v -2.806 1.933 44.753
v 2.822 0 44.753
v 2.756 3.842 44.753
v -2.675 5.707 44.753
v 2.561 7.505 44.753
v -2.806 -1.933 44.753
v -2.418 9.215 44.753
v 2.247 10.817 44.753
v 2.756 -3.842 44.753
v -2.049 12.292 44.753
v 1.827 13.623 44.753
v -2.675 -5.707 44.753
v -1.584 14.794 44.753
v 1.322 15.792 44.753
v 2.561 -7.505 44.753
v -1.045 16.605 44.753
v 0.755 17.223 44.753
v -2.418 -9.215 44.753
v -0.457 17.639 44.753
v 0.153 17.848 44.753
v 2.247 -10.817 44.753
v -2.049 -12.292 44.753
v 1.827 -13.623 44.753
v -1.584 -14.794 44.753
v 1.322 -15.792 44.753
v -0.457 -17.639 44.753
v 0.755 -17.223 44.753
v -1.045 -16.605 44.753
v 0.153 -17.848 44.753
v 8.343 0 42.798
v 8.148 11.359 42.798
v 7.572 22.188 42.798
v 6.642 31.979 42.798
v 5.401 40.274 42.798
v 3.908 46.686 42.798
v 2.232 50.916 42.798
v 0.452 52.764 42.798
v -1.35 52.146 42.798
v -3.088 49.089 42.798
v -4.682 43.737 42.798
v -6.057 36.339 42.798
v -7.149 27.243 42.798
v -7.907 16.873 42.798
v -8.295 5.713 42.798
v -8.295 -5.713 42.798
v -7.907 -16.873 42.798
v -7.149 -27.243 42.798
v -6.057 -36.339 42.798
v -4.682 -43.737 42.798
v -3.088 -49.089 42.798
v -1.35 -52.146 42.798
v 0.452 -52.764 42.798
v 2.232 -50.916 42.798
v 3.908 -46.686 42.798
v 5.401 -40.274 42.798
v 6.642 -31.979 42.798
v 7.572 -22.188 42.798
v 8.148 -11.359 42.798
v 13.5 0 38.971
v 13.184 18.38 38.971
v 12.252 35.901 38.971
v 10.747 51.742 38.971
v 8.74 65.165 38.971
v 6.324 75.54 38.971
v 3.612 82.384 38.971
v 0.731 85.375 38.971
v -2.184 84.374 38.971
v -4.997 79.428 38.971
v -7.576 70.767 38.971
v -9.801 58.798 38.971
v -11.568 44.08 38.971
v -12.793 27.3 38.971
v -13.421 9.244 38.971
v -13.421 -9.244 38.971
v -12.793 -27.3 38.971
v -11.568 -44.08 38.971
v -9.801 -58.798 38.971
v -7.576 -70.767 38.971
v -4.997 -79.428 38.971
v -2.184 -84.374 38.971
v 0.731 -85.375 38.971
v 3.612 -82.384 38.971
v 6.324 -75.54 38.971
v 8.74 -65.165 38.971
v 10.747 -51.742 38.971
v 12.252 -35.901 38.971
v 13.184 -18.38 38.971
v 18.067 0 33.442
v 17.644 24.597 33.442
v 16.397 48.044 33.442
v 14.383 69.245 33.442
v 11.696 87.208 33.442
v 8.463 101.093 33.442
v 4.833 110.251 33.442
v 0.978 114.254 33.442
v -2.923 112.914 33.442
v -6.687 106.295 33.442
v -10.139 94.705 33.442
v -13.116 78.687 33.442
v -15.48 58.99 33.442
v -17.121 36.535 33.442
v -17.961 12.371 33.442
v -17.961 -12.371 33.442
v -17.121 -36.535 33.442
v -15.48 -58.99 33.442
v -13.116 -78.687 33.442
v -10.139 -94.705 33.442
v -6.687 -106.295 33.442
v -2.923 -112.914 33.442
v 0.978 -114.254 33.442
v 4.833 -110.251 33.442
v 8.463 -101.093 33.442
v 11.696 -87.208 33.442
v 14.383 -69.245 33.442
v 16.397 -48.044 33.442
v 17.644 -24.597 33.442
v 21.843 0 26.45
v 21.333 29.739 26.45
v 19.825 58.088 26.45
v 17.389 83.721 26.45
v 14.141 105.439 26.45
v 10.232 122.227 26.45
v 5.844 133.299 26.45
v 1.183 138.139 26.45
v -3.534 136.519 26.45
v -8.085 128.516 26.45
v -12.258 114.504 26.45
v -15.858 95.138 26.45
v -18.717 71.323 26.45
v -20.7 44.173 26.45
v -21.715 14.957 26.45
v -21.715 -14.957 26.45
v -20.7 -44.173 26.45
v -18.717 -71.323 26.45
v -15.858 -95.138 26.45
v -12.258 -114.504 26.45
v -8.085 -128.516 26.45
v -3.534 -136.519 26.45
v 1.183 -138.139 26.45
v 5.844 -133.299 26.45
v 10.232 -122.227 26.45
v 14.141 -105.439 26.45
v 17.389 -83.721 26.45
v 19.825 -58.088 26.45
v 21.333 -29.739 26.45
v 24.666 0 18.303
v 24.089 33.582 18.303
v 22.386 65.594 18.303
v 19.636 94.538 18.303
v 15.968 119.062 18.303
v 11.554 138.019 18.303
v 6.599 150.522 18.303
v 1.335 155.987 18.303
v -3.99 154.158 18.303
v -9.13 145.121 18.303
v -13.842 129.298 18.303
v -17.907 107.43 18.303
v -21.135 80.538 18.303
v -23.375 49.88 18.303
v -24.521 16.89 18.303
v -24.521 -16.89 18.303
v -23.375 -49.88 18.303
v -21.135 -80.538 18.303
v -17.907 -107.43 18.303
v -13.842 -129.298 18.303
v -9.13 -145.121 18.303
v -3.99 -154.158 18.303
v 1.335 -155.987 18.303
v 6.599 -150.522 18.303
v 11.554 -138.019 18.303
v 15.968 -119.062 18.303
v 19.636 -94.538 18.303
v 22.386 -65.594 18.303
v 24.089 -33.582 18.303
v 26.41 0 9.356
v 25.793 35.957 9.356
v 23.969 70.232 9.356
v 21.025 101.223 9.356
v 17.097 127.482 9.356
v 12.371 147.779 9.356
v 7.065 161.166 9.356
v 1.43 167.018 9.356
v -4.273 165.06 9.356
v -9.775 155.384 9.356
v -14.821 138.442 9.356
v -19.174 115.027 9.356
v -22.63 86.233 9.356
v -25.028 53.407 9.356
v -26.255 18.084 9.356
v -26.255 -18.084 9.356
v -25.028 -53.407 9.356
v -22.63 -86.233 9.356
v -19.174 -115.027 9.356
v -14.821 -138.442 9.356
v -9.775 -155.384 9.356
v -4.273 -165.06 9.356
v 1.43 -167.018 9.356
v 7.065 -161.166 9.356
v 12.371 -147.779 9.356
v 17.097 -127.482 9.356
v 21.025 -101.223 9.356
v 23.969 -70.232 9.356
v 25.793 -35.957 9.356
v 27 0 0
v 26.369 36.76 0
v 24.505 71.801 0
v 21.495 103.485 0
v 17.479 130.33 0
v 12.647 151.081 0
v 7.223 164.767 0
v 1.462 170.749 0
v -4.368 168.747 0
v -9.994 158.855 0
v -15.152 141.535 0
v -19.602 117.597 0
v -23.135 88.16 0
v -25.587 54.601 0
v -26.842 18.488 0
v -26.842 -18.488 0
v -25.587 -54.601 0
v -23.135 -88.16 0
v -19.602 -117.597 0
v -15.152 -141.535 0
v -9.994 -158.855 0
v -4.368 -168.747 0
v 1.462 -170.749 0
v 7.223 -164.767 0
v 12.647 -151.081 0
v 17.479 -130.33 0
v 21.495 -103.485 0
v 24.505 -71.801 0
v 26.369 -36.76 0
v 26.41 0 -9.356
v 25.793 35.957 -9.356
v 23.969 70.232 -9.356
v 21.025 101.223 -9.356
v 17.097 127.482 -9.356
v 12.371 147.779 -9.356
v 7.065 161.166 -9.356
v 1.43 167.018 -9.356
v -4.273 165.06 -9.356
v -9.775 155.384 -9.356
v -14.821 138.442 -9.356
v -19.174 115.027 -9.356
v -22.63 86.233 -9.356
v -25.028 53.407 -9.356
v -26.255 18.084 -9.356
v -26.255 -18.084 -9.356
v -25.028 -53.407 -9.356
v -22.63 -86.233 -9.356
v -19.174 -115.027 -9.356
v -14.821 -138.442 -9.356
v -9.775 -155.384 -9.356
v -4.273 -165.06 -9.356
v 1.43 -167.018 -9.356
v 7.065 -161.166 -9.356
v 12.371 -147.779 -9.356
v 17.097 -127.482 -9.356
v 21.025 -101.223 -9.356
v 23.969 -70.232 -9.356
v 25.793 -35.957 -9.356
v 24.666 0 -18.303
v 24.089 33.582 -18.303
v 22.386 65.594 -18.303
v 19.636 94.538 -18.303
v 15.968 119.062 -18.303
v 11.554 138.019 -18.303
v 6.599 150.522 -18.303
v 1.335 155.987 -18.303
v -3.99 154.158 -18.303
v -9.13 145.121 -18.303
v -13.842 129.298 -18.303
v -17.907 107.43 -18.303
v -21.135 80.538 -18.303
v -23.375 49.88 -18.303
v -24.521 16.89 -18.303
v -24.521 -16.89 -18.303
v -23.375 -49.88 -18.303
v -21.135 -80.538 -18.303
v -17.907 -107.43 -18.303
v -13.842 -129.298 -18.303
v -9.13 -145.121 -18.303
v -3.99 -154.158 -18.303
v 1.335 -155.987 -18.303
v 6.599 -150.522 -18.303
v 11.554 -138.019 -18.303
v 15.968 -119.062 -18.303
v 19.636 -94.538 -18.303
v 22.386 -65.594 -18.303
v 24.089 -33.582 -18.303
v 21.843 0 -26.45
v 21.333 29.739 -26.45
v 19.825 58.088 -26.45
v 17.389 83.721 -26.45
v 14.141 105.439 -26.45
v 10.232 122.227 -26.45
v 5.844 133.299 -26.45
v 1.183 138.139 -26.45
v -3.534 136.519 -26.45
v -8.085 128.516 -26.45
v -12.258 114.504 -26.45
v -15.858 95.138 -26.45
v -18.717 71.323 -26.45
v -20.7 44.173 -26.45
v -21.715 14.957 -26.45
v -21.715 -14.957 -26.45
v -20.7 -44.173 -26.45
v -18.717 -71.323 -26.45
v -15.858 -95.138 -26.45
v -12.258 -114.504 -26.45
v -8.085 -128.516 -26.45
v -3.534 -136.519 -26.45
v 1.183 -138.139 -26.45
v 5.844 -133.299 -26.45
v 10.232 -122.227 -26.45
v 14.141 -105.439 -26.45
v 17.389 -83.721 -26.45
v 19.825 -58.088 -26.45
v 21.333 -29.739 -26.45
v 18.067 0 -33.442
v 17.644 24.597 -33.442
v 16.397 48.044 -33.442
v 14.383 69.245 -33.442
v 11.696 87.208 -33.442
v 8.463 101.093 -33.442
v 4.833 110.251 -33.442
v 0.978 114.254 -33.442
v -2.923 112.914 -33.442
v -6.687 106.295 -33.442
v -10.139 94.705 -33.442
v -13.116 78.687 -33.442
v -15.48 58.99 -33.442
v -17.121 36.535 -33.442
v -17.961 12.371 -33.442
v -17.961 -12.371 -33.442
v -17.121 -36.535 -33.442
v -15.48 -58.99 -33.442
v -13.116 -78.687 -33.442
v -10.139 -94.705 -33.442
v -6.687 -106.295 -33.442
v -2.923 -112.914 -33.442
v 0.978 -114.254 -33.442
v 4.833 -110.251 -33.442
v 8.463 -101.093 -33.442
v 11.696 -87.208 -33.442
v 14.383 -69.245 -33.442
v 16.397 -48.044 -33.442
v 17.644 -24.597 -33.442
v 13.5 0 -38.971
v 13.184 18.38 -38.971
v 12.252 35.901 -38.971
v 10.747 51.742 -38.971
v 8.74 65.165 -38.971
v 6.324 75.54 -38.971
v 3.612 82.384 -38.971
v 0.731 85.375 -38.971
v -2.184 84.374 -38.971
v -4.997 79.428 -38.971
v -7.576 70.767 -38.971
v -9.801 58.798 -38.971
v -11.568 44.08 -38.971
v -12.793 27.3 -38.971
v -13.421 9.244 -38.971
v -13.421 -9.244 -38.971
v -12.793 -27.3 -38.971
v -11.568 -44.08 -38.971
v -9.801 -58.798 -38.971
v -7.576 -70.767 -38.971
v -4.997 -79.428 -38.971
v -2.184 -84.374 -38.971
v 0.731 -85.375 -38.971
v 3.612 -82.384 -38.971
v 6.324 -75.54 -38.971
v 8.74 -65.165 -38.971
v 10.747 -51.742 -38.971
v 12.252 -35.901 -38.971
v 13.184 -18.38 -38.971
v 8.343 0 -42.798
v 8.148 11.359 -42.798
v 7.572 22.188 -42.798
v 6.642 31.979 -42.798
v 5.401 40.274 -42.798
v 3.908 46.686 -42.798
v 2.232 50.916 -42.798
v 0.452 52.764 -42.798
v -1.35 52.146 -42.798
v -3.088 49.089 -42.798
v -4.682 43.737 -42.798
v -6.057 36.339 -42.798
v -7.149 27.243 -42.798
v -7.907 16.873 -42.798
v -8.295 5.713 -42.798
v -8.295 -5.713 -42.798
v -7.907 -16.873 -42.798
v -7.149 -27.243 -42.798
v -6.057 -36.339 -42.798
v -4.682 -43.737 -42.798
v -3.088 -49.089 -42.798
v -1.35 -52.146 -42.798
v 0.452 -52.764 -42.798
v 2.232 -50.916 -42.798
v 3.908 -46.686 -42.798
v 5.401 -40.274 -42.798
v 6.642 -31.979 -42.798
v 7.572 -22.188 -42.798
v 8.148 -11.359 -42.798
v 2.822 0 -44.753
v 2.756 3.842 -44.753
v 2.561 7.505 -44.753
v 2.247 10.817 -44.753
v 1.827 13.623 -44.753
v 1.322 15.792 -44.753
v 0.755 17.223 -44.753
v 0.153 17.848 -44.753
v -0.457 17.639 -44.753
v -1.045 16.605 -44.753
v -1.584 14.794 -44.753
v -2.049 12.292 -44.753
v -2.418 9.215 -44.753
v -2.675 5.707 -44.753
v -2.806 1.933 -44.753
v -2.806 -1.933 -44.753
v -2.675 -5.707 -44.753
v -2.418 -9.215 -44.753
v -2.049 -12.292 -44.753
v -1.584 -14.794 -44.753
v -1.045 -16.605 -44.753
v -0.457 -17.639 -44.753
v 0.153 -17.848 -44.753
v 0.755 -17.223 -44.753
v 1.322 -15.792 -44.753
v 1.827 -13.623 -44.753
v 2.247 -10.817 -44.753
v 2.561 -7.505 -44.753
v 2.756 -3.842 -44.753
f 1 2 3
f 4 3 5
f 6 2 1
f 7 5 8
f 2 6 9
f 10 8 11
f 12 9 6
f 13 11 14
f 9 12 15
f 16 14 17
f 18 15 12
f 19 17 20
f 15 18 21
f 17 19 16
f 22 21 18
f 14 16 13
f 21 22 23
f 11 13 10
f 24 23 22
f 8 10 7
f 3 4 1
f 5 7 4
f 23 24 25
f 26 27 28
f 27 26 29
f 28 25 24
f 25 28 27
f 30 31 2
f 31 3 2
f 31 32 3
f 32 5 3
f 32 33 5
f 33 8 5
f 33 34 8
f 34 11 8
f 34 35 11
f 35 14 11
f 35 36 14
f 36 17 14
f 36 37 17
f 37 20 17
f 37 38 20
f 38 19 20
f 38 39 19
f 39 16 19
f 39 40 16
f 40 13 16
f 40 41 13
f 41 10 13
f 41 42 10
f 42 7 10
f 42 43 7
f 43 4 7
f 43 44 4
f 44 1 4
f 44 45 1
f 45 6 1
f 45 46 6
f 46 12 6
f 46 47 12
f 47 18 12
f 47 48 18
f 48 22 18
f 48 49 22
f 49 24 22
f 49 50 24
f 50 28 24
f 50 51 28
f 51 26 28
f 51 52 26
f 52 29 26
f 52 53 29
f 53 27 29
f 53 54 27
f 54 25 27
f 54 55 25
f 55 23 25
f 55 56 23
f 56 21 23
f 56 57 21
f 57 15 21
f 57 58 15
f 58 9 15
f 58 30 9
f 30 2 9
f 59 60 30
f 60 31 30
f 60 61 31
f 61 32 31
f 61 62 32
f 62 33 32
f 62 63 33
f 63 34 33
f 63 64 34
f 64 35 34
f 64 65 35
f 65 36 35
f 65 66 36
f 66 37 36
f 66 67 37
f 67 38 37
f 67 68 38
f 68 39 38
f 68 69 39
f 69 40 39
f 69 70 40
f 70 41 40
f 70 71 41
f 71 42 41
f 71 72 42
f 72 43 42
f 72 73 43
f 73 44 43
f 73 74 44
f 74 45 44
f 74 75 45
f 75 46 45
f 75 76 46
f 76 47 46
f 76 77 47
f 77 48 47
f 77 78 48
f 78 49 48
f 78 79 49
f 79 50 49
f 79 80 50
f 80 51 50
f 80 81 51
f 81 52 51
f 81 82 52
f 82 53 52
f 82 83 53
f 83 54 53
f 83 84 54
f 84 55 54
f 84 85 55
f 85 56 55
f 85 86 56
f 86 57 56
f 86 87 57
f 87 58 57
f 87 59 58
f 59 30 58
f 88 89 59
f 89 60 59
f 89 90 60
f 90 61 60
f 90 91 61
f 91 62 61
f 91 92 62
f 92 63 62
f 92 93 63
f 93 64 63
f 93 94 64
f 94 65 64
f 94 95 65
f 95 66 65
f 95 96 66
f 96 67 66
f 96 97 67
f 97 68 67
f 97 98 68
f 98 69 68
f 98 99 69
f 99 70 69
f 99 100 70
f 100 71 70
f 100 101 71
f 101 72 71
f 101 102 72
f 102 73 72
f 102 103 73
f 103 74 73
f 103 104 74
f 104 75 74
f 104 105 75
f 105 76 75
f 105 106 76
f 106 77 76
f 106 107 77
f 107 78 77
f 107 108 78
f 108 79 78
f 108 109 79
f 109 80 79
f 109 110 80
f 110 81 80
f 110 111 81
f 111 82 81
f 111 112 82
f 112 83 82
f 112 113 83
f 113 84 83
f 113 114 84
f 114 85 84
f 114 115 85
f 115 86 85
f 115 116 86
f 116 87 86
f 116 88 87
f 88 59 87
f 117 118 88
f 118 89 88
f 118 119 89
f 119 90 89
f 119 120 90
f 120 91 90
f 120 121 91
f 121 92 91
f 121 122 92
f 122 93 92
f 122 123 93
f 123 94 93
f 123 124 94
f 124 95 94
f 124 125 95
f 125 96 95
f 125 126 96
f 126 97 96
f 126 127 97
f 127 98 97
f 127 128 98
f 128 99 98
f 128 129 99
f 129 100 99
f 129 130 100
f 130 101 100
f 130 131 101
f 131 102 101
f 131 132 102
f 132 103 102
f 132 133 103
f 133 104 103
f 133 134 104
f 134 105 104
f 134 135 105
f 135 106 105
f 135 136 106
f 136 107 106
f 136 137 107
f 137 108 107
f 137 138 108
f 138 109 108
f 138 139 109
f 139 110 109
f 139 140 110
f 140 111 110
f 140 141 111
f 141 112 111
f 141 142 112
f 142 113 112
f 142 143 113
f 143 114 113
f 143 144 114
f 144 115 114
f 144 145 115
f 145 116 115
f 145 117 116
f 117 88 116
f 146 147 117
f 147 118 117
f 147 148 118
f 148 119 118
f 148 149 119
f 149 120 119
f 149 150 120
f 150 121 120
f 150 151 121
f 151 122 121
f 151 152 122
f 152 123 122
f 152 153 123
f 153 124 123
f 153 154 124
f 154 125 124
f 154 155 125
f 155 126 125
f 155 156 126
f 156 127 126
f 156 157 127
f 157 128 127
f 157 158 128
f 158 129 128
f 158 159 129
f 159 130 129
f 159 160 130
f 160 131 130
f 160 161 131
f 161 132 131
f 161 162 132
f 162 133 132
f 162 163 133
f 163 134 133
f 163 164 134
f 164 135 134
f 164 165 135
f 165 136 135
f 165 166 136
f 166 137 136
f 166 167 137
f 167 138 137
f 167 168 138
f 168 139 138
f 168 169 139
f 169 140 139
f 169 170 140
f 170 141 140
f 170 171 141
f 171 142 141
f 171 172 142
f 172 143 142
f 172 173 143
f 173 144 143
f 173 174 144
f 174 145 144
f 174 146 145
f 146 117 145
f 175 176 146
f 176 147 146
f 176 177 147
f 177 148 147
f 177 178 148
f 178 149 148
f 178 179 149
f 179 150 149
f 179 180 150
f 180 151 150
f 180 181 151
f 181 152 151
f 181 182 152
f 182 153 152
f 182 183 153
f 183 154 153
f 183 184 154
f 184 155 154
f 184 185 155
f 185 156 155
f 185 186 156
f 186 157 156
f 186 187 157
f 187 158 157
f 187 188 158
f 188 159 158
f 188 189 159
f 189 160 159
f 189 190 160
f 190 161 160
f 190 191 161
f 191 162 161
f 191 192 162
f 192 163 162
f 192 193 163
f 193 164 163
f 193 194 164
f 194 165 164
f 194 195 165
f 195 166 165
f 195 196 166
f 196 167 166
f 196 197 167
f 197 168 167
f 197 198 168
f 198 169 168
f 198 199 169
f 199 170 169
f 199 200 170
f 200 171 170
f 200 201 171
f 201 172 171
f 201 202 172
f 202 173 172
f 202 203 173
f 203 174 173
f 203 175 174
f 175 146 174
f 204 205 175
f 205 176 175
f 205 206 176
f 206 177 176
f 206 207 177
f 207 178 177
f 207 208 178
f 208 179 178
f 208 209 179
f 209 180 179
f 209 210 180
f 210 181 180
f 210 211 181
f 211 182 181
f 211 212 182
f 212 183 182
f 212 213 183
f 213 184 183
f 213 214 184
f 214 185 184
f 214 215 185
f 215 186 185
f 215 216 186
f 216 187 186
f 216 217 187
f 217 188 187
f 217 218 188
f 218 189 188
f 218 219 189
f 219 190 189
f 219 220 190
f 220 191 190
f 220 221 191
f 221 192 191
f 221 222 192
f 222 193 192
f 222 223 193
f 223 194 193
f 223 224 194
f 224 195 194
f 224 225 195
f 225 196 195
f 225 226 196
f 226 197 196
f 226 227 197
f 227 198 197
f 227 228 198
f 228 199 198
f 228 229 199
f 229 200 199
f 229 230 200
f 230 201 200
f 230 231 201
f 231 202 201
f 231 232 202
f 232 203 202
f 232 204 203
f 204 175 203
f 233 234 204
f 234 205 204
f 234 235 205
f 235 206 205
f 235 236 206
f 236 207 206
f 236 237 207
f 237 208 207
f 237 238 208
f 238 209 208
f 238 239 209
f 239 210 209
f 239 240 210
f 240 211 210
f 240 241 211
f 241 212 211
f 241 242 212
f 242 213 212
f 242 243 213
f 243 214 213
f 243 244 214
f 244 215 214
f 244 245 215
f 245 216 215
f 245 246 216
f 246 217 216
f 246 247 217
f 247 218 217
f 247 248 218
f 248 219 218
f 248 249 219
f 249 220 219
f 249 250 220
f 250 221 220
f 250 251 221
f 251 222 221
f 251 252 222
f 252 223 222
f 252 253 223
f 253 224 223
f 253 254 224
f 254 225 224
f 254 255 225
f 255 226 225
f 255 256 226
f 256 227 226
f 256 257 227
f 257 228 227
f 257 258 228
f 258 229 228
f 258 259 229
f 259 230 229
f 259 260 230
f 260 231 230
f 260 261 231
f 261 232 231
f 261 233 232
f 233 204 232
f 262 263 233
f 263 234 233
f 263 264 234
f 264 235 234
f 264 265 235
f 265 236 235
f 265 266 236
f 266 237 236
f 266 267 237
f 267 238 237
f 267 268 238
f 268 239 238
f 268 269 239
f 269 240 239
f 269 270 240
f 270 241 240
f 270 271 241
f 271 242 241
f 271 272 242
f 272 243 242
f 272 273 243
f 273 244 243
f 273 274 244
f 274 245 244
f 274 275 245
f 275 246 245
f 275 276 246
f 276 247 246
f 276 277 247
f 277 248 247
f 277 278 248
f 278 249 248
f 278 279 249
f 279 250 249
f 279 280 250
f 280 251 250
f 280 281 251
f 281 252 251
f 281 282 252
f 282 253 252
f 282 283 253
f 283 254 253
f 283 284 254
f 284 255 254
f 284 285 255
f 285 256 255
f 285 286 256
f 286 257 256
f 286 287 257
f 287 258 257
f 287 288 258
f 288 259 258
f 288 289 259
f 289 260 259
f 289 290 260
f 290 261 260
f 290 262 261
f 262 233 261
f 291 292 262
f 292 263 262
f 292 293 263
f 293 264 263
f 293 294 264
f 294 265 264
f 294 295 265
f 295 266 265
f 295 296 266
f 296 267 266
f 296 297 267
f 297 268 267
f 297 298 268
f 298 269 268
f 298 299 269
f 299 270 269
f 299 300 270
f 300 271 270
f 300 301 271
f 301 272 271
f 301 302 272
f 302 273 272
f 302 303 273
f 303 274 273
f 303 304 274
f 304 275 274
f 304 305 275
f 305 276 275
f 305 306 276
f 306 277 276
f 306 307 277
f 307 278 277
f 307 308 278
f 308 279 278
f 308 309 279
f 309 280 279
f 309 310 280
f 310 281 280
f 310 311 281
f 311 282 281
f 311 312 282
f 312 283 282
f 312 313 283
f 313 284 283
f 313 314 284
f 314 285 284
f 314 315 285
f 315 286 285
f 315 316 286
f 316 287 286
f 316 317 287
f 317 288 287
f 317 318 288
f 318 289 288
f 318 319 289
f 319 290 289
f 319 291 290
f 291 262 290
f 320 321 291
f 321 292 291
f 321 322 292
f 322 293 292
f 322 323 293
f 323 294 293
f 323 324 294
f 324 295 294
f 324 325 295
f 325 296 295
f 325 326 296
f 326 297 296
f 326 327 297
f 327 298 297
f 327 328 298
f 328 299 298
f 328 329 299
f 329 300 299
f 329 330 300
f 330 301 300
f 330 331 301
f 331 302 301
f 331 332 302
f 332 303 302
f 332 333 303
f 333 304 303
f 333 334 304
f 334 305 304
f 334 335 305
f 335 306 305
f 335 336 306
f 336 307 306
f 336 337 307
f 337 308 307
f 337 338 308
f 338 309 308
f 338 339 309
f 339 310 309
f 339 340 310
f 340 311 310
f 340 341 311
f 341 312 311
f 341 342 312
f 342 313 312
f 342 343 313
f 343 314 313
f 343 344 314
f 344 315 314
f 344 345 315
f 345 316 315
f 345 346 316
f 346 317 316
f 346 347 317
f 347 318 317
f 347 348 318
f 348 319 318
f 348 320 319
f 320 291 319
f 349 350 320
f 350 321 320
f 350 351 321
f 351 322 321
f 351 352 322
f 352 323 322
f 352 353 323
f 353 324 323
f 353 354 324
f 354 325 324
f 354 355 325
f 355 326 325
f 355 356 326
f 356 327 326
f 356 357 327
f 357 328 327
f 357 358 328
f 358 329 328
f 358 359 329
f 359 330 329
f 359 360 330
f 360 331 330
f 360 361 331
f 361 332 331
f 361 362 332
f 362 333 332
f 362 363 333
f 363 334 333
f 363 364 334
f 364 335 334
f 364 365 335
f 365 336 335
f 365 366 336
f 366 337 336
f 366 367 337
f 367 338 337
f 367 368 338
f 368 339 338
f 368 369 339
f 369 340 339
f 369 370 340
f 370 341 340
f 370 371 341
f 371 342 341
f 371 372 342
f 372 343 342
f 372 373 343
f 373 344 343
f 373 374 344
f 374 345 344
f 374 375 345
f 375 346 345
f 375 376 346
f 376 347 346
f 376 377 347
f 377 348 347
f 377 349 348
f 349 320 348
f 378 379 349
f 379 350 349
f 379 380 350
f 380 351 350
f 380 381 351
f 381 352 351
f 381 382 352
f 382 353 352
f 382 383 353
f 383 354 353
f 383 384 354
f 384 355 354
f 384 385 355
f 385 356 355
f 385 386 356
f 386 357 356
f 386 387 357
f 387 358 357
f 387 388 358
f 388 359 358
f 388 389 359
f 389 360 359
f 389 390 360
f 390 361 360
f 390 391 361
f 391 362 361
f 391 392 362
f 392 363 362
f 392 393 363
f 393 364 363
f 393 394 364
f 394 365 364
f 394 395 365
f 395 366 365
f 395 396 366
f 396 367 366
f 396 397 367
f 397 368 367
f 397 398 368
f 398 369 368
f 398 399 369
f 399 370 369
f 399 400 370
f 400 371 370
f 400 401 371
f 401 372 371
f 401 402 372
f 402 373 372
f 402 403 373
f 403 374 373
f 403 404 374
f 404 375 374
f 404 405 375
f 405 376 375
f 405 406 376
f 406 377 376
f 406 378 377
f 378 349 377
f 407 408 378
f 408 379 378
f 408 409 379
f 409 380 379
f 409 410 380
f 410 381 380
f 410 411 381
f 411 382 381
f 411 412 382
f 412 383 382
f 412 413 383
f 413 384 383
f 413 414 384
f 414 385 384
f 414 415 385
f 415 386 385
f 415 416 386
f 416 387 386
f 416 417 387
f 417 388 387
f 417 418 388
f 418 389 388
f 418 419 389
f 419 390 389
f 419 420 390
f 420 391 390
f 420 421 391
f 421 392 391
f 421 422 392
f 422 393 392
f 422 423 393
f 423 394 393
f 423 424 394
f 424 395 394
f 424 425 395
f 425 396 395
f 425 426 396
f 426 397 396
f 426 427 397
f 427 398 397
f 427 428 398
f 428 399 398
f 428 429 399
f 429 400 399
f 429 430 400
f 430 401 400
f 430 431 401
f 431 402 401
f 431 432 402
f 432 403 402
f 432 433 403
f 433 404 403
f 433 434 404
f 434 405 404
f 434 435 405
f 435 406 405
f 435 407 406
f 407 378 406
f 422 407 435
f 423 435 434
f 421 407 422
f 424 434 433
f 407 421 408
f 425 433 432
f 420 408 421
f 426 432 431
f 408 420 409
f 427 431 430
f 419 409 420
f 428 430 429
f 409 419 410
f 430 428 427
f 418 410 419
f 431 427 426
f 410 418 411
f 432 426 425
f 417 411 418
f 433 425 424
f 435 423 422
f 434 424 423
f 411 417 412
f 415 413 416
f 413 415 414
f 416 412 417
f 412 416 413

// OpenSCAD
// Generated by SolidPython 1.0.1 on 2020-07-29 00:46:46


scale(v = [3, 19, 5]) {
	sphere(r = 9);
}
/***********************************************
*********      SolidPython code:      **********
************************************************
 
# import packages: SolidPython
from solid import *
from solid.utils import *
from itertools import chain, combinations, permutations


class Resize:

    def __init__(self, scad_file):
        self.scad_file = scad_file
        #self.scad_file = import_scad(scad_file)
        # cone/cylinder param:
        self.r1 = 0
        self.r2 = 0
        self.h = 0
        # rectangular prism param:
        self.w = 0
        self.l = 0
        # ellipse param:
        self.r = 0

    # import OpenScad code (file name corresponds to shape)


    # classify shape + parameters
    def assign(self, param1, param2, param3):
        if self.scad_file == 'cone.scad':
            self.r1 = param1
            self.r2 = param2
            self.h = param3
        elif self.scad_file == 'cylinder.scad':
            self.r1 = param1
            self.r2 = param2
            self.h = param3
        elif self.scad_file == 'rectangularPrism.scad':
            self.h = param1
            self.l = param2
            self.w = param3
        else:
            self.r = param1
            self.h = param2

    # resize parameters
    def iterate(self):
        x = range(3, 20, 2)
        i = 1
        if self.scad_file == 'cone.scad':
            tempList = list(permutations(x, 2))
            for temp in tempList:
                param1 = temp[0]
                param2 = temp[1]
                filepath = 'produced_scad_files/' + 'cone' + str(param1) + '_' + str(param2) + '_' + '.scad'
                scad_render_to_file(cylinder(h=param1, r1=param2, r2=0), filepath)

        elif self.scad_file == 'cylinder.scad':
            tempList = list(permutations(x, 3))
            for temp in tempList:
                param1 = temp[0]
                param2 = temp[1]
                filepath = 'produced_scad_files/' + 'cylinder' + str(param1) + '_' + str(param2) + '_' + '.scad'
                scad_render_to_file(cylinder(h=param1, r1=param2, r2=param2), filepath)

        elif self.scad_file == 'rectangularPrism.scad':
            tempList = list(permutations(x, 3))
            for temp in tempList:
                param1 = temp[0]
                param2 = temp[1]
                param3 = temp[2]
                filepath = 'produced_scad_files/' + 'rectangularPrism' + str(param1) + '_' + str(param2) + '_' + str(
                    param3) + '.scad'
                scad_render_to_file(cube(size=(param1, param2, param3)), filepath)

        elif self.scad_file == 'ellipse.scad':
            tempList = list(permutations(x, 4))
            for temp in tempList:
                param1 = temp[0]
                param2 = temp[1]
                param3 = temp[2]
                param4 = temp[3]
                filepath = 'produced_scad_files/' + 'ellipse' + str(param1) + '_' + str(param2) + '_' + str(param3) + '_' + str(param4) + '.scad'
                scad_render_to_file(scale([param1, param2, param3])(sphere(r=param4)), filepath)

    def render_to_scadfile(self):
        scad_render_to_file(scad, 'example.scad') 
 
************************************************/
